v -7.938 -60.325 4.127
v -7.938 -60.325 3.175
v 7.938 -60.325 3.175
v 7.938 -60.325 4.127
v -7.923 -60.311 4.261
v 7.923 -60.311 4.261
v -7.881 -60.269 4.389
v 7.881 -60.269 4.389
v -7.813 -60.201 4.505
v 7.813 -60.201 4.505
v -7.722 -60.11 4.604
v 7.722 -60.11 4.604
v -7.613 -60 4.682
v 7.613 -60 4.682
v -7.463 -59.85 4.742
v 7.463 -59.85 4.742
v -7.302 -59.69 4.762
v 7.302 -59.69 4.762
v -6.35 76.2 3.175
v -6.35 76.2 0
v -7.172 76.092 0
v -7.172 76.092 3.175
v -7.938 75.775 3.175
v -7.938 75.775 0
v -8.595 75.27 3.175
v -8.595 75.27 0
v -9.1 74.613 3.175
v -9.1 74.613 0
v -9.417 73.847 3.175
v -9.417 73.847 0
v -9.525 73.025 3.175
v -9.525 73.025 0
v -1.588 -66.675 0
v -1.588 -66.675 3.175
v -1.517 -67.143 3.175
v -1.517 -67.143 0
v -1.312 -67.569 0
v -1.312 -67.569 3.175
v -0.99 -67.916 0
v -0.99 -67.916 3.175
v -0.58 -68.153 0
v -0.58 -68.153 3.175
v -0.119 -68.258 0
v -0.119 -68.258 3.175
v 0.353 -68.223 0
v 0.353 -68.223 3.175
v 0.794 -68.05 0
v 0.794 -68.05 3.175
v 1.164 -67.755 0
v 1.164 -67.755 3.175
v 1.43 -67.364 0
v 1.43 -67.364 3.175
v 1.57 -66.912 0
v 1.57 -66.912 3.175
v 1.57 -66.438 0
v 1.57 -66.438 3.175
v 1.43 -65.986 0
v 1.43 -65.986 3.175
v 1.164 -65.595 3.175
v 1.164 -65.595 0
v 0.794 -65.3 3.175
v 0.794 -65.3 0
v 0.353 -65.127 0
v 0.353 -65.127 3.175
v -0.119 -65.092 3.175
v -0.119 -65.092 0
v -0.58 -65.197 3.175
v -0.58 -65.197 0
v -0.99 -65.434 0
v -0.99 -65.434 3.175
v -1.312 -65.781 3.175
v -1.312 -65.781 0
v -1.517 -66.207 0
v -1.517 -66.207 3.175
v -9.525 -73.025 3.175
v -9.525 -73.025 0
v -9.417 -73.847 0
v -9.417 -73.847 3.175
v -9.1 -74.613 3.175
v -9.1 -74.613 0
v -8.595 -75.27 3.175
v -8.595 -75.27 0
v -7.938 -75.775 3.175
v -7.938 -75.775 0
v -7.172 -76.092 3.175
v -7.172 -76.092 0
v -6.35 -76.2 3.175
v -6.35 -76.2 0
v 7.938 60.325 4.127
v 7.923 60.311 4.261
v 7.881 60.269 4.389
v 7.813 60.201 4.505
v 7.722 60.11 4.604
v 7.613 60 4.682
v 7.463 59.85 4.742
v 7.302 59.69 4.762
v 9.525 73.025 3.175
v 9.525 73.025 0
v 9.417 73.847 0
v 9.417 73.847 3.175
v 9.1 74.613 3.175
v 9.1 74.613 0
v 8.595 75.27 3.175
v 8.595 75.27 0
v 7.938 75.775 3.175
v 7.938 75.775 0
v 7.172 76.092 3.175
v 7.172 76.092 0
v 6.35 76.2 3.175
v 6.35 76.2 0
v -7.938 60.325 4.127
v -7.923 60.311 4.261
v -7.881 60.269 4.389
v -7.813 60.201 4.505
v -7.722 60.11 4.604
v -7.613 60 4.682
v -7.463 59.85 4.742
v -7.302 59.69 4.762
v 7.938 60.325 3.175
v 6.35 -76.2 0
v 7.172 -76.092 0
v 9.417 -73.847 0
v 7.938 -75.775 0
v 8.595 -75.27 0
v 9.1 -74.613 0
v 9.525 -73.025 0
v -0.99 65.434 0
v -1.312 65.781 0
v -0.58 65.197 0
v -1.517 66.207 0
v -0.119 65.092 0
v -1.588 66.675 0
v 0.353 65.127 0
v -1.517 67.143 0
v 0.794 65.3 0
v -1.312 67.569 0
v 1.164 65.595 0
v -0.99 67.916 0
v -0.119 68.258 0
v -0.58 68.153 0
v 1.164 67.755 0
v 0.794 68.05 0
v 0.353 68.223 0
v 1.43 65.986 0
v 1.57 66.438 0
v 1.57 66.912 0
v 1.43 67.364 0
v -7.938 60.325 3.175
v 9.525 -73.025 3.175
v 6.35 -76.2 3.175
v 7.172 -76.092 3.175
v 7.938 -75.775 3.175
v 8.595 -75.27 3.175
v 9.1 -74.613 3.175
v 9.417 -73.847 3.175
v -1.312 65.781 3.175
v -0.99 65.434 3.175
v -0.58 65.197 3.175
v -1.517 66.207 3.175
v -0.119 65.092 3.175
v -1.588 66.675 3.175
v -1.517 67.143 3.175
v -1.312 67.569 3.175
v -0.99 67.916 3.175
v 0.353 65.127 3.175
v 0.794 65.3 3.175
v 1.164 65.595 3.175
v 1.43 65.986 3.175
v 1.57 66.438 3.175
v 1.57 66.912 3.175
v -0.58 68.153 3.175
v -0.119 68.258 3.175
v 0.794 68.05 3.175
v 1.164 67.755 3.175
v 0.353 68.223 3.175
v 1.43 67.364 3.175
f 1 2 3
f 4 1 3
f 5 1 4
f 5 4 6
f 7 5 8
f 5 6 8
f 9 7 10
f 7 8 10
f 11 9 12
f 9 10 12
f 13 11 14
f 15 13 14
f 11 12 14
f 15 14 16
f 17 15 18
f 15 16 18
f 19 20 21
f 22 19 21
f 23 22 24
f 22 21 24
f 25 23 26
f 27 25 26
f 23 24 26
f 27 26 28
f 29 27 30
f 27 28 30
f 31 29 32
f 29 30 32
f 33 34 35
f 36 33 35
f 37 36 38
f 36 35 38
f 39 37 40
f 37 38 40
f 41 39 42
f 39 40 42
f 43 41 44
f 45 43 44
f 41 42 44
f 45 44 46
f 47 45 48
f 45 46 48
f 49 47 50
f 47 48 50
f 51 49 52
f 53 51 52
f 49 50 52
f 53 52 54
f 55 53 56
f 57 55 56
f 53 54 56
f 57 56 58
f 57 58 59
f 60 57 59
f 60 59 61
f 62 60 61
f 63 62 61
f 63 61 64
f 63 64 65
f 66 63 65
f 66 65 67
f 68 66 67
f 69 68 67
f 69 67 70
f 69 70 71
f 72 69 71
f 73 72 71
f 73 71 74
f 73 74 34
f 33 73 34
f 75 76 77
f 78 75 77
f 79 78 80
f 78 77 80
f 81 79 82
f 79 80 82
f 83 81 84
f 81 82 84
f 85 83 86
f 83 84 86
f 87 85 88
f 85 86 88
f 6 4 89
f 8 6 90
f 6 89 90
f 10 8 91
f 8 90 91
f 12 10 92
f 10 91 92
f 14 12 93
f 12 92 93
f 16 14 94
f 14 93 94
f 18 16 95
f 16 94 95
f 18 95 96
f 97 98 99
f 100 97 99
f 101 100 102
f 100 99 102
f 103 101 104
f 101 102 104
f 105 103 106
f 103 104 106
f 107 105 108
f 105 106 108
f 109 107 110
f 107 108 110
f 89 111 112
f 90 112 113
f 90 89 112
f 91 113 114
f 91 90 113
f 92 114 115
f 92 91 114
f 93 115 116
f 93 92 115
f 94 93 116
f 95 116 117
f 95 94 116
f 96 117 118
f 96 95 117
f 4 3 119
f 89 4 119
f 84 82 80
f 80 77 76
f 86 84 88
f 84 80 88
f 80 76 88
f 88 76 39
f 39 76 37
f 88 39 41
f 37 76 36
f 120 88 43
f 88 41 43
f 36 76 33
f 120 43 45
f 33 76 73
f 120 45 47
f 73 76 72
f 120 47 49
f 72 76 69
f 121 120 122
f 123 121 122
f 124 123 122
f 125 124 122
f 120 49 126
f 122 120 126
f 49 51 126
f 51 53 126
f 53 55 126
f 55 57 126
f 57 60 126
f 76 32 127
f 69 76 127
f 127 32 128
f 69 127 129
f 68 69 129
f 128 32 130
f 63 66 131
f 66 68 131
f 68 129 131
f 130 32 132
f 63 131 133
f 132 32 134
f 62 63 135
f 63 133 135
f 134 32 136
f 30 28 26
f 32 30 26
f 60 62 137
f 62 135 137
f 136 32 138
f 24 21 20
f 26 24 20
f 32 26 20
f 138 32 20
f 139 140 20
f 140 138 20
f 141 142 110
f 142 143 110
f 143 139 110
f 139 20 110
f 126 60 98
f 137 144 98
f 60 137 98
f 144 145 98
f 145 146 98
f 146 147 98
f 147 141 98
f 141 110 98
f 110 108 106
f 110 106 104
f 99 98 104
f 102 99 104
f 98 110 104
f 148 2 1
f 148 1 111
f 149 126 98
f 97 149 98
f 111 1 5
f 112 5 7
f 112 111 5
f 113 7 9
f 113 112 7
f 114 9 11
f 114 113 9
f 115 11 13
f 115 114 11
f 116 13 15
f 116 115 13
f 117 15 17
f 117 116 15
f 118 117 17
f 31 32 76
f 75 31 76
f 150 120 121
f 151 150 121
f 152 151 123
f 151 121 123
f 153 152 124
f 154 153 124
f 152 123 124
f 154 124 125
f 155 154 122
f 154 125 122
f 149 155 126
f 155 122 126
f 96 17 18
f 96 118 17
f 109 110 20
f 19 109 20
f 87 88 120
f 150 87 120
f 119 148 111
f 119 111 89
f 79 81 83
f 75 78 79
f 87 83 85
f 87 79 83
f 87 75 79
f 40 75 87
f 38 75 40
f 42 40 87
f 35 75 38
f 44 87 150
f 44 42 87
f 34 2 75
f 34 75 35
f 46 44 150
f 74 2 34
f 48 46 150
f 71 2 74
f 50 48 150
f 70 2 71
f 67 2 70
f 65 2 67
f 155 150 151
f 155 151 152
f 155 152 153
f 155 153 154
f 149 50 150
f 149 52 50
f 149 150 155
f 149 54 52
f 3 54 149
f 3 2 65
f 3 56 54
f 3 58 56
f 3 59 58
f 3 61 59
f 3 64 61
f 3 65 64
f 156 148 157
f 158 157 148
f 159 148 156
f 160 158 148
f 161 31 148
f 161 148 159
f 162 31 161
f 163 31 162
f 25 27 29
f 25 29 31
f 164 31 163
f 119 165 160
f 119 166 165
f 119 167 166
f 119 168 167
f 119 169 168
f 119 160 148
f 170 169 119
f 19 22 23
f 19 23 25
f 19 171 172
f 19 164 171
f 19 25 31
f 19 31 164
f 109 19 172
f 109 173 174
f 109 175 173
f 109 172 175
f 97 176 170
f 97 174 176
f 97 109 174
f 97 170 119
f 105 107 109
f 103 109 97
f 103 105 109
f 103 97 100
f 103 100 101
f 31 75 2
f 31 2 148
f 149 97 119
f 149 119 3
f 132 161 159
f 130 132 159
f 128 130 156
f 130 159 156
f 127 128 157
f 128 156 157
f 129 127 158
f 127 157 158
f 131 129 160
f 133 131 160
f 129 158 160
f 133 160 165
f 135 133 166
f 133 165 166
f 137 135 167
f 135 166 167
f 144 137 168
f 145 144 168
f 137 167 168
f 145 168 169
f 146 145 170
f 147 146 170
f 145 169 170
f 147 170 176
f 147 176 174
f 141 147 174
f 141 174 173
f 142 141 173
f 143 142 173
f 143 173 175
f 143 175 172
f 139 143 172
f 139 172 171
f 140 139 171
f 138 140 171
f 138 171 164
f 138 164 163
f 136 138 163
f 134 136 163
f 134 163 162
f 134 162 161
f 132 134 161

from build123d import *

# Parameters (mm, degrees)
F1_DEPTH = 3.175
F2_D     = 3.175
F3_W     = 15.875
F3_H     = 120.65
F4_DEPTH = 1.5875
F5_R     = 0.635


# Not quite as in the source:
# - a feature names something its author has since deleted; it is built from what else it names


with BuildPart() as f1:
    # F0 (on Top) → F1 (new body)
    with BuildSketch(Plane.XY):
        with BuildLine():
            Line((6.35, 76.2), (-6.35, 76.2))
            ThreePointArc((-6.35, 76.2), (-8.5950640303, 75.2700640303), (-9.525, 73.025))
            Line((-9.525, 73.025), (-9.525, -73.025))
            ThreePointArc((-9.525, -73.025), (-8.5950640303, -75.2700640303), (-6.35, -76.2))
            Line((-6.35, -76.2), (6.35, -76.2))
            ThreePointArc((6.35, -76.2), (8.5950640303, -75.2700640303), (9.525, -73.025))
            Line((9.525, -73.025), (9.525, 73.025))
            ThreePointArc((9.525, 73.025), (8.5950640303, 75.2700640303), (6.35, 76.2))
        make_face()
    extrude(amount=F1_DEPTH)

    # F2 (through all)
    with Locations(Plane(origin=(0, 0, 0), x_dir=(1, 0, 0), z_dir=(0, 0, -1))):
        with Locations((0, 66.675), (0, -66.675)):
            Hole(F2_D / 2)

    # F3 (on face) → F4 (join)
    with BuildSketch(Plane.XY.offset(3.175)):
        Rectangle(F3_W, F3_H)
    extrude(amount=F4_DEPTH)

    # F5
    f5_edges = [f1.edges().sort_by_distance(p)[0] for p in [
        (0, -60.325, 4.7625),
        (7.9375, 0, 4.7625),
        (-7.9375, 0, 4.7625),
        (0, 60.325, 4.7625),
    ]]
    fillet(f5_edges, radius=F5_R)


solid = f1.part
